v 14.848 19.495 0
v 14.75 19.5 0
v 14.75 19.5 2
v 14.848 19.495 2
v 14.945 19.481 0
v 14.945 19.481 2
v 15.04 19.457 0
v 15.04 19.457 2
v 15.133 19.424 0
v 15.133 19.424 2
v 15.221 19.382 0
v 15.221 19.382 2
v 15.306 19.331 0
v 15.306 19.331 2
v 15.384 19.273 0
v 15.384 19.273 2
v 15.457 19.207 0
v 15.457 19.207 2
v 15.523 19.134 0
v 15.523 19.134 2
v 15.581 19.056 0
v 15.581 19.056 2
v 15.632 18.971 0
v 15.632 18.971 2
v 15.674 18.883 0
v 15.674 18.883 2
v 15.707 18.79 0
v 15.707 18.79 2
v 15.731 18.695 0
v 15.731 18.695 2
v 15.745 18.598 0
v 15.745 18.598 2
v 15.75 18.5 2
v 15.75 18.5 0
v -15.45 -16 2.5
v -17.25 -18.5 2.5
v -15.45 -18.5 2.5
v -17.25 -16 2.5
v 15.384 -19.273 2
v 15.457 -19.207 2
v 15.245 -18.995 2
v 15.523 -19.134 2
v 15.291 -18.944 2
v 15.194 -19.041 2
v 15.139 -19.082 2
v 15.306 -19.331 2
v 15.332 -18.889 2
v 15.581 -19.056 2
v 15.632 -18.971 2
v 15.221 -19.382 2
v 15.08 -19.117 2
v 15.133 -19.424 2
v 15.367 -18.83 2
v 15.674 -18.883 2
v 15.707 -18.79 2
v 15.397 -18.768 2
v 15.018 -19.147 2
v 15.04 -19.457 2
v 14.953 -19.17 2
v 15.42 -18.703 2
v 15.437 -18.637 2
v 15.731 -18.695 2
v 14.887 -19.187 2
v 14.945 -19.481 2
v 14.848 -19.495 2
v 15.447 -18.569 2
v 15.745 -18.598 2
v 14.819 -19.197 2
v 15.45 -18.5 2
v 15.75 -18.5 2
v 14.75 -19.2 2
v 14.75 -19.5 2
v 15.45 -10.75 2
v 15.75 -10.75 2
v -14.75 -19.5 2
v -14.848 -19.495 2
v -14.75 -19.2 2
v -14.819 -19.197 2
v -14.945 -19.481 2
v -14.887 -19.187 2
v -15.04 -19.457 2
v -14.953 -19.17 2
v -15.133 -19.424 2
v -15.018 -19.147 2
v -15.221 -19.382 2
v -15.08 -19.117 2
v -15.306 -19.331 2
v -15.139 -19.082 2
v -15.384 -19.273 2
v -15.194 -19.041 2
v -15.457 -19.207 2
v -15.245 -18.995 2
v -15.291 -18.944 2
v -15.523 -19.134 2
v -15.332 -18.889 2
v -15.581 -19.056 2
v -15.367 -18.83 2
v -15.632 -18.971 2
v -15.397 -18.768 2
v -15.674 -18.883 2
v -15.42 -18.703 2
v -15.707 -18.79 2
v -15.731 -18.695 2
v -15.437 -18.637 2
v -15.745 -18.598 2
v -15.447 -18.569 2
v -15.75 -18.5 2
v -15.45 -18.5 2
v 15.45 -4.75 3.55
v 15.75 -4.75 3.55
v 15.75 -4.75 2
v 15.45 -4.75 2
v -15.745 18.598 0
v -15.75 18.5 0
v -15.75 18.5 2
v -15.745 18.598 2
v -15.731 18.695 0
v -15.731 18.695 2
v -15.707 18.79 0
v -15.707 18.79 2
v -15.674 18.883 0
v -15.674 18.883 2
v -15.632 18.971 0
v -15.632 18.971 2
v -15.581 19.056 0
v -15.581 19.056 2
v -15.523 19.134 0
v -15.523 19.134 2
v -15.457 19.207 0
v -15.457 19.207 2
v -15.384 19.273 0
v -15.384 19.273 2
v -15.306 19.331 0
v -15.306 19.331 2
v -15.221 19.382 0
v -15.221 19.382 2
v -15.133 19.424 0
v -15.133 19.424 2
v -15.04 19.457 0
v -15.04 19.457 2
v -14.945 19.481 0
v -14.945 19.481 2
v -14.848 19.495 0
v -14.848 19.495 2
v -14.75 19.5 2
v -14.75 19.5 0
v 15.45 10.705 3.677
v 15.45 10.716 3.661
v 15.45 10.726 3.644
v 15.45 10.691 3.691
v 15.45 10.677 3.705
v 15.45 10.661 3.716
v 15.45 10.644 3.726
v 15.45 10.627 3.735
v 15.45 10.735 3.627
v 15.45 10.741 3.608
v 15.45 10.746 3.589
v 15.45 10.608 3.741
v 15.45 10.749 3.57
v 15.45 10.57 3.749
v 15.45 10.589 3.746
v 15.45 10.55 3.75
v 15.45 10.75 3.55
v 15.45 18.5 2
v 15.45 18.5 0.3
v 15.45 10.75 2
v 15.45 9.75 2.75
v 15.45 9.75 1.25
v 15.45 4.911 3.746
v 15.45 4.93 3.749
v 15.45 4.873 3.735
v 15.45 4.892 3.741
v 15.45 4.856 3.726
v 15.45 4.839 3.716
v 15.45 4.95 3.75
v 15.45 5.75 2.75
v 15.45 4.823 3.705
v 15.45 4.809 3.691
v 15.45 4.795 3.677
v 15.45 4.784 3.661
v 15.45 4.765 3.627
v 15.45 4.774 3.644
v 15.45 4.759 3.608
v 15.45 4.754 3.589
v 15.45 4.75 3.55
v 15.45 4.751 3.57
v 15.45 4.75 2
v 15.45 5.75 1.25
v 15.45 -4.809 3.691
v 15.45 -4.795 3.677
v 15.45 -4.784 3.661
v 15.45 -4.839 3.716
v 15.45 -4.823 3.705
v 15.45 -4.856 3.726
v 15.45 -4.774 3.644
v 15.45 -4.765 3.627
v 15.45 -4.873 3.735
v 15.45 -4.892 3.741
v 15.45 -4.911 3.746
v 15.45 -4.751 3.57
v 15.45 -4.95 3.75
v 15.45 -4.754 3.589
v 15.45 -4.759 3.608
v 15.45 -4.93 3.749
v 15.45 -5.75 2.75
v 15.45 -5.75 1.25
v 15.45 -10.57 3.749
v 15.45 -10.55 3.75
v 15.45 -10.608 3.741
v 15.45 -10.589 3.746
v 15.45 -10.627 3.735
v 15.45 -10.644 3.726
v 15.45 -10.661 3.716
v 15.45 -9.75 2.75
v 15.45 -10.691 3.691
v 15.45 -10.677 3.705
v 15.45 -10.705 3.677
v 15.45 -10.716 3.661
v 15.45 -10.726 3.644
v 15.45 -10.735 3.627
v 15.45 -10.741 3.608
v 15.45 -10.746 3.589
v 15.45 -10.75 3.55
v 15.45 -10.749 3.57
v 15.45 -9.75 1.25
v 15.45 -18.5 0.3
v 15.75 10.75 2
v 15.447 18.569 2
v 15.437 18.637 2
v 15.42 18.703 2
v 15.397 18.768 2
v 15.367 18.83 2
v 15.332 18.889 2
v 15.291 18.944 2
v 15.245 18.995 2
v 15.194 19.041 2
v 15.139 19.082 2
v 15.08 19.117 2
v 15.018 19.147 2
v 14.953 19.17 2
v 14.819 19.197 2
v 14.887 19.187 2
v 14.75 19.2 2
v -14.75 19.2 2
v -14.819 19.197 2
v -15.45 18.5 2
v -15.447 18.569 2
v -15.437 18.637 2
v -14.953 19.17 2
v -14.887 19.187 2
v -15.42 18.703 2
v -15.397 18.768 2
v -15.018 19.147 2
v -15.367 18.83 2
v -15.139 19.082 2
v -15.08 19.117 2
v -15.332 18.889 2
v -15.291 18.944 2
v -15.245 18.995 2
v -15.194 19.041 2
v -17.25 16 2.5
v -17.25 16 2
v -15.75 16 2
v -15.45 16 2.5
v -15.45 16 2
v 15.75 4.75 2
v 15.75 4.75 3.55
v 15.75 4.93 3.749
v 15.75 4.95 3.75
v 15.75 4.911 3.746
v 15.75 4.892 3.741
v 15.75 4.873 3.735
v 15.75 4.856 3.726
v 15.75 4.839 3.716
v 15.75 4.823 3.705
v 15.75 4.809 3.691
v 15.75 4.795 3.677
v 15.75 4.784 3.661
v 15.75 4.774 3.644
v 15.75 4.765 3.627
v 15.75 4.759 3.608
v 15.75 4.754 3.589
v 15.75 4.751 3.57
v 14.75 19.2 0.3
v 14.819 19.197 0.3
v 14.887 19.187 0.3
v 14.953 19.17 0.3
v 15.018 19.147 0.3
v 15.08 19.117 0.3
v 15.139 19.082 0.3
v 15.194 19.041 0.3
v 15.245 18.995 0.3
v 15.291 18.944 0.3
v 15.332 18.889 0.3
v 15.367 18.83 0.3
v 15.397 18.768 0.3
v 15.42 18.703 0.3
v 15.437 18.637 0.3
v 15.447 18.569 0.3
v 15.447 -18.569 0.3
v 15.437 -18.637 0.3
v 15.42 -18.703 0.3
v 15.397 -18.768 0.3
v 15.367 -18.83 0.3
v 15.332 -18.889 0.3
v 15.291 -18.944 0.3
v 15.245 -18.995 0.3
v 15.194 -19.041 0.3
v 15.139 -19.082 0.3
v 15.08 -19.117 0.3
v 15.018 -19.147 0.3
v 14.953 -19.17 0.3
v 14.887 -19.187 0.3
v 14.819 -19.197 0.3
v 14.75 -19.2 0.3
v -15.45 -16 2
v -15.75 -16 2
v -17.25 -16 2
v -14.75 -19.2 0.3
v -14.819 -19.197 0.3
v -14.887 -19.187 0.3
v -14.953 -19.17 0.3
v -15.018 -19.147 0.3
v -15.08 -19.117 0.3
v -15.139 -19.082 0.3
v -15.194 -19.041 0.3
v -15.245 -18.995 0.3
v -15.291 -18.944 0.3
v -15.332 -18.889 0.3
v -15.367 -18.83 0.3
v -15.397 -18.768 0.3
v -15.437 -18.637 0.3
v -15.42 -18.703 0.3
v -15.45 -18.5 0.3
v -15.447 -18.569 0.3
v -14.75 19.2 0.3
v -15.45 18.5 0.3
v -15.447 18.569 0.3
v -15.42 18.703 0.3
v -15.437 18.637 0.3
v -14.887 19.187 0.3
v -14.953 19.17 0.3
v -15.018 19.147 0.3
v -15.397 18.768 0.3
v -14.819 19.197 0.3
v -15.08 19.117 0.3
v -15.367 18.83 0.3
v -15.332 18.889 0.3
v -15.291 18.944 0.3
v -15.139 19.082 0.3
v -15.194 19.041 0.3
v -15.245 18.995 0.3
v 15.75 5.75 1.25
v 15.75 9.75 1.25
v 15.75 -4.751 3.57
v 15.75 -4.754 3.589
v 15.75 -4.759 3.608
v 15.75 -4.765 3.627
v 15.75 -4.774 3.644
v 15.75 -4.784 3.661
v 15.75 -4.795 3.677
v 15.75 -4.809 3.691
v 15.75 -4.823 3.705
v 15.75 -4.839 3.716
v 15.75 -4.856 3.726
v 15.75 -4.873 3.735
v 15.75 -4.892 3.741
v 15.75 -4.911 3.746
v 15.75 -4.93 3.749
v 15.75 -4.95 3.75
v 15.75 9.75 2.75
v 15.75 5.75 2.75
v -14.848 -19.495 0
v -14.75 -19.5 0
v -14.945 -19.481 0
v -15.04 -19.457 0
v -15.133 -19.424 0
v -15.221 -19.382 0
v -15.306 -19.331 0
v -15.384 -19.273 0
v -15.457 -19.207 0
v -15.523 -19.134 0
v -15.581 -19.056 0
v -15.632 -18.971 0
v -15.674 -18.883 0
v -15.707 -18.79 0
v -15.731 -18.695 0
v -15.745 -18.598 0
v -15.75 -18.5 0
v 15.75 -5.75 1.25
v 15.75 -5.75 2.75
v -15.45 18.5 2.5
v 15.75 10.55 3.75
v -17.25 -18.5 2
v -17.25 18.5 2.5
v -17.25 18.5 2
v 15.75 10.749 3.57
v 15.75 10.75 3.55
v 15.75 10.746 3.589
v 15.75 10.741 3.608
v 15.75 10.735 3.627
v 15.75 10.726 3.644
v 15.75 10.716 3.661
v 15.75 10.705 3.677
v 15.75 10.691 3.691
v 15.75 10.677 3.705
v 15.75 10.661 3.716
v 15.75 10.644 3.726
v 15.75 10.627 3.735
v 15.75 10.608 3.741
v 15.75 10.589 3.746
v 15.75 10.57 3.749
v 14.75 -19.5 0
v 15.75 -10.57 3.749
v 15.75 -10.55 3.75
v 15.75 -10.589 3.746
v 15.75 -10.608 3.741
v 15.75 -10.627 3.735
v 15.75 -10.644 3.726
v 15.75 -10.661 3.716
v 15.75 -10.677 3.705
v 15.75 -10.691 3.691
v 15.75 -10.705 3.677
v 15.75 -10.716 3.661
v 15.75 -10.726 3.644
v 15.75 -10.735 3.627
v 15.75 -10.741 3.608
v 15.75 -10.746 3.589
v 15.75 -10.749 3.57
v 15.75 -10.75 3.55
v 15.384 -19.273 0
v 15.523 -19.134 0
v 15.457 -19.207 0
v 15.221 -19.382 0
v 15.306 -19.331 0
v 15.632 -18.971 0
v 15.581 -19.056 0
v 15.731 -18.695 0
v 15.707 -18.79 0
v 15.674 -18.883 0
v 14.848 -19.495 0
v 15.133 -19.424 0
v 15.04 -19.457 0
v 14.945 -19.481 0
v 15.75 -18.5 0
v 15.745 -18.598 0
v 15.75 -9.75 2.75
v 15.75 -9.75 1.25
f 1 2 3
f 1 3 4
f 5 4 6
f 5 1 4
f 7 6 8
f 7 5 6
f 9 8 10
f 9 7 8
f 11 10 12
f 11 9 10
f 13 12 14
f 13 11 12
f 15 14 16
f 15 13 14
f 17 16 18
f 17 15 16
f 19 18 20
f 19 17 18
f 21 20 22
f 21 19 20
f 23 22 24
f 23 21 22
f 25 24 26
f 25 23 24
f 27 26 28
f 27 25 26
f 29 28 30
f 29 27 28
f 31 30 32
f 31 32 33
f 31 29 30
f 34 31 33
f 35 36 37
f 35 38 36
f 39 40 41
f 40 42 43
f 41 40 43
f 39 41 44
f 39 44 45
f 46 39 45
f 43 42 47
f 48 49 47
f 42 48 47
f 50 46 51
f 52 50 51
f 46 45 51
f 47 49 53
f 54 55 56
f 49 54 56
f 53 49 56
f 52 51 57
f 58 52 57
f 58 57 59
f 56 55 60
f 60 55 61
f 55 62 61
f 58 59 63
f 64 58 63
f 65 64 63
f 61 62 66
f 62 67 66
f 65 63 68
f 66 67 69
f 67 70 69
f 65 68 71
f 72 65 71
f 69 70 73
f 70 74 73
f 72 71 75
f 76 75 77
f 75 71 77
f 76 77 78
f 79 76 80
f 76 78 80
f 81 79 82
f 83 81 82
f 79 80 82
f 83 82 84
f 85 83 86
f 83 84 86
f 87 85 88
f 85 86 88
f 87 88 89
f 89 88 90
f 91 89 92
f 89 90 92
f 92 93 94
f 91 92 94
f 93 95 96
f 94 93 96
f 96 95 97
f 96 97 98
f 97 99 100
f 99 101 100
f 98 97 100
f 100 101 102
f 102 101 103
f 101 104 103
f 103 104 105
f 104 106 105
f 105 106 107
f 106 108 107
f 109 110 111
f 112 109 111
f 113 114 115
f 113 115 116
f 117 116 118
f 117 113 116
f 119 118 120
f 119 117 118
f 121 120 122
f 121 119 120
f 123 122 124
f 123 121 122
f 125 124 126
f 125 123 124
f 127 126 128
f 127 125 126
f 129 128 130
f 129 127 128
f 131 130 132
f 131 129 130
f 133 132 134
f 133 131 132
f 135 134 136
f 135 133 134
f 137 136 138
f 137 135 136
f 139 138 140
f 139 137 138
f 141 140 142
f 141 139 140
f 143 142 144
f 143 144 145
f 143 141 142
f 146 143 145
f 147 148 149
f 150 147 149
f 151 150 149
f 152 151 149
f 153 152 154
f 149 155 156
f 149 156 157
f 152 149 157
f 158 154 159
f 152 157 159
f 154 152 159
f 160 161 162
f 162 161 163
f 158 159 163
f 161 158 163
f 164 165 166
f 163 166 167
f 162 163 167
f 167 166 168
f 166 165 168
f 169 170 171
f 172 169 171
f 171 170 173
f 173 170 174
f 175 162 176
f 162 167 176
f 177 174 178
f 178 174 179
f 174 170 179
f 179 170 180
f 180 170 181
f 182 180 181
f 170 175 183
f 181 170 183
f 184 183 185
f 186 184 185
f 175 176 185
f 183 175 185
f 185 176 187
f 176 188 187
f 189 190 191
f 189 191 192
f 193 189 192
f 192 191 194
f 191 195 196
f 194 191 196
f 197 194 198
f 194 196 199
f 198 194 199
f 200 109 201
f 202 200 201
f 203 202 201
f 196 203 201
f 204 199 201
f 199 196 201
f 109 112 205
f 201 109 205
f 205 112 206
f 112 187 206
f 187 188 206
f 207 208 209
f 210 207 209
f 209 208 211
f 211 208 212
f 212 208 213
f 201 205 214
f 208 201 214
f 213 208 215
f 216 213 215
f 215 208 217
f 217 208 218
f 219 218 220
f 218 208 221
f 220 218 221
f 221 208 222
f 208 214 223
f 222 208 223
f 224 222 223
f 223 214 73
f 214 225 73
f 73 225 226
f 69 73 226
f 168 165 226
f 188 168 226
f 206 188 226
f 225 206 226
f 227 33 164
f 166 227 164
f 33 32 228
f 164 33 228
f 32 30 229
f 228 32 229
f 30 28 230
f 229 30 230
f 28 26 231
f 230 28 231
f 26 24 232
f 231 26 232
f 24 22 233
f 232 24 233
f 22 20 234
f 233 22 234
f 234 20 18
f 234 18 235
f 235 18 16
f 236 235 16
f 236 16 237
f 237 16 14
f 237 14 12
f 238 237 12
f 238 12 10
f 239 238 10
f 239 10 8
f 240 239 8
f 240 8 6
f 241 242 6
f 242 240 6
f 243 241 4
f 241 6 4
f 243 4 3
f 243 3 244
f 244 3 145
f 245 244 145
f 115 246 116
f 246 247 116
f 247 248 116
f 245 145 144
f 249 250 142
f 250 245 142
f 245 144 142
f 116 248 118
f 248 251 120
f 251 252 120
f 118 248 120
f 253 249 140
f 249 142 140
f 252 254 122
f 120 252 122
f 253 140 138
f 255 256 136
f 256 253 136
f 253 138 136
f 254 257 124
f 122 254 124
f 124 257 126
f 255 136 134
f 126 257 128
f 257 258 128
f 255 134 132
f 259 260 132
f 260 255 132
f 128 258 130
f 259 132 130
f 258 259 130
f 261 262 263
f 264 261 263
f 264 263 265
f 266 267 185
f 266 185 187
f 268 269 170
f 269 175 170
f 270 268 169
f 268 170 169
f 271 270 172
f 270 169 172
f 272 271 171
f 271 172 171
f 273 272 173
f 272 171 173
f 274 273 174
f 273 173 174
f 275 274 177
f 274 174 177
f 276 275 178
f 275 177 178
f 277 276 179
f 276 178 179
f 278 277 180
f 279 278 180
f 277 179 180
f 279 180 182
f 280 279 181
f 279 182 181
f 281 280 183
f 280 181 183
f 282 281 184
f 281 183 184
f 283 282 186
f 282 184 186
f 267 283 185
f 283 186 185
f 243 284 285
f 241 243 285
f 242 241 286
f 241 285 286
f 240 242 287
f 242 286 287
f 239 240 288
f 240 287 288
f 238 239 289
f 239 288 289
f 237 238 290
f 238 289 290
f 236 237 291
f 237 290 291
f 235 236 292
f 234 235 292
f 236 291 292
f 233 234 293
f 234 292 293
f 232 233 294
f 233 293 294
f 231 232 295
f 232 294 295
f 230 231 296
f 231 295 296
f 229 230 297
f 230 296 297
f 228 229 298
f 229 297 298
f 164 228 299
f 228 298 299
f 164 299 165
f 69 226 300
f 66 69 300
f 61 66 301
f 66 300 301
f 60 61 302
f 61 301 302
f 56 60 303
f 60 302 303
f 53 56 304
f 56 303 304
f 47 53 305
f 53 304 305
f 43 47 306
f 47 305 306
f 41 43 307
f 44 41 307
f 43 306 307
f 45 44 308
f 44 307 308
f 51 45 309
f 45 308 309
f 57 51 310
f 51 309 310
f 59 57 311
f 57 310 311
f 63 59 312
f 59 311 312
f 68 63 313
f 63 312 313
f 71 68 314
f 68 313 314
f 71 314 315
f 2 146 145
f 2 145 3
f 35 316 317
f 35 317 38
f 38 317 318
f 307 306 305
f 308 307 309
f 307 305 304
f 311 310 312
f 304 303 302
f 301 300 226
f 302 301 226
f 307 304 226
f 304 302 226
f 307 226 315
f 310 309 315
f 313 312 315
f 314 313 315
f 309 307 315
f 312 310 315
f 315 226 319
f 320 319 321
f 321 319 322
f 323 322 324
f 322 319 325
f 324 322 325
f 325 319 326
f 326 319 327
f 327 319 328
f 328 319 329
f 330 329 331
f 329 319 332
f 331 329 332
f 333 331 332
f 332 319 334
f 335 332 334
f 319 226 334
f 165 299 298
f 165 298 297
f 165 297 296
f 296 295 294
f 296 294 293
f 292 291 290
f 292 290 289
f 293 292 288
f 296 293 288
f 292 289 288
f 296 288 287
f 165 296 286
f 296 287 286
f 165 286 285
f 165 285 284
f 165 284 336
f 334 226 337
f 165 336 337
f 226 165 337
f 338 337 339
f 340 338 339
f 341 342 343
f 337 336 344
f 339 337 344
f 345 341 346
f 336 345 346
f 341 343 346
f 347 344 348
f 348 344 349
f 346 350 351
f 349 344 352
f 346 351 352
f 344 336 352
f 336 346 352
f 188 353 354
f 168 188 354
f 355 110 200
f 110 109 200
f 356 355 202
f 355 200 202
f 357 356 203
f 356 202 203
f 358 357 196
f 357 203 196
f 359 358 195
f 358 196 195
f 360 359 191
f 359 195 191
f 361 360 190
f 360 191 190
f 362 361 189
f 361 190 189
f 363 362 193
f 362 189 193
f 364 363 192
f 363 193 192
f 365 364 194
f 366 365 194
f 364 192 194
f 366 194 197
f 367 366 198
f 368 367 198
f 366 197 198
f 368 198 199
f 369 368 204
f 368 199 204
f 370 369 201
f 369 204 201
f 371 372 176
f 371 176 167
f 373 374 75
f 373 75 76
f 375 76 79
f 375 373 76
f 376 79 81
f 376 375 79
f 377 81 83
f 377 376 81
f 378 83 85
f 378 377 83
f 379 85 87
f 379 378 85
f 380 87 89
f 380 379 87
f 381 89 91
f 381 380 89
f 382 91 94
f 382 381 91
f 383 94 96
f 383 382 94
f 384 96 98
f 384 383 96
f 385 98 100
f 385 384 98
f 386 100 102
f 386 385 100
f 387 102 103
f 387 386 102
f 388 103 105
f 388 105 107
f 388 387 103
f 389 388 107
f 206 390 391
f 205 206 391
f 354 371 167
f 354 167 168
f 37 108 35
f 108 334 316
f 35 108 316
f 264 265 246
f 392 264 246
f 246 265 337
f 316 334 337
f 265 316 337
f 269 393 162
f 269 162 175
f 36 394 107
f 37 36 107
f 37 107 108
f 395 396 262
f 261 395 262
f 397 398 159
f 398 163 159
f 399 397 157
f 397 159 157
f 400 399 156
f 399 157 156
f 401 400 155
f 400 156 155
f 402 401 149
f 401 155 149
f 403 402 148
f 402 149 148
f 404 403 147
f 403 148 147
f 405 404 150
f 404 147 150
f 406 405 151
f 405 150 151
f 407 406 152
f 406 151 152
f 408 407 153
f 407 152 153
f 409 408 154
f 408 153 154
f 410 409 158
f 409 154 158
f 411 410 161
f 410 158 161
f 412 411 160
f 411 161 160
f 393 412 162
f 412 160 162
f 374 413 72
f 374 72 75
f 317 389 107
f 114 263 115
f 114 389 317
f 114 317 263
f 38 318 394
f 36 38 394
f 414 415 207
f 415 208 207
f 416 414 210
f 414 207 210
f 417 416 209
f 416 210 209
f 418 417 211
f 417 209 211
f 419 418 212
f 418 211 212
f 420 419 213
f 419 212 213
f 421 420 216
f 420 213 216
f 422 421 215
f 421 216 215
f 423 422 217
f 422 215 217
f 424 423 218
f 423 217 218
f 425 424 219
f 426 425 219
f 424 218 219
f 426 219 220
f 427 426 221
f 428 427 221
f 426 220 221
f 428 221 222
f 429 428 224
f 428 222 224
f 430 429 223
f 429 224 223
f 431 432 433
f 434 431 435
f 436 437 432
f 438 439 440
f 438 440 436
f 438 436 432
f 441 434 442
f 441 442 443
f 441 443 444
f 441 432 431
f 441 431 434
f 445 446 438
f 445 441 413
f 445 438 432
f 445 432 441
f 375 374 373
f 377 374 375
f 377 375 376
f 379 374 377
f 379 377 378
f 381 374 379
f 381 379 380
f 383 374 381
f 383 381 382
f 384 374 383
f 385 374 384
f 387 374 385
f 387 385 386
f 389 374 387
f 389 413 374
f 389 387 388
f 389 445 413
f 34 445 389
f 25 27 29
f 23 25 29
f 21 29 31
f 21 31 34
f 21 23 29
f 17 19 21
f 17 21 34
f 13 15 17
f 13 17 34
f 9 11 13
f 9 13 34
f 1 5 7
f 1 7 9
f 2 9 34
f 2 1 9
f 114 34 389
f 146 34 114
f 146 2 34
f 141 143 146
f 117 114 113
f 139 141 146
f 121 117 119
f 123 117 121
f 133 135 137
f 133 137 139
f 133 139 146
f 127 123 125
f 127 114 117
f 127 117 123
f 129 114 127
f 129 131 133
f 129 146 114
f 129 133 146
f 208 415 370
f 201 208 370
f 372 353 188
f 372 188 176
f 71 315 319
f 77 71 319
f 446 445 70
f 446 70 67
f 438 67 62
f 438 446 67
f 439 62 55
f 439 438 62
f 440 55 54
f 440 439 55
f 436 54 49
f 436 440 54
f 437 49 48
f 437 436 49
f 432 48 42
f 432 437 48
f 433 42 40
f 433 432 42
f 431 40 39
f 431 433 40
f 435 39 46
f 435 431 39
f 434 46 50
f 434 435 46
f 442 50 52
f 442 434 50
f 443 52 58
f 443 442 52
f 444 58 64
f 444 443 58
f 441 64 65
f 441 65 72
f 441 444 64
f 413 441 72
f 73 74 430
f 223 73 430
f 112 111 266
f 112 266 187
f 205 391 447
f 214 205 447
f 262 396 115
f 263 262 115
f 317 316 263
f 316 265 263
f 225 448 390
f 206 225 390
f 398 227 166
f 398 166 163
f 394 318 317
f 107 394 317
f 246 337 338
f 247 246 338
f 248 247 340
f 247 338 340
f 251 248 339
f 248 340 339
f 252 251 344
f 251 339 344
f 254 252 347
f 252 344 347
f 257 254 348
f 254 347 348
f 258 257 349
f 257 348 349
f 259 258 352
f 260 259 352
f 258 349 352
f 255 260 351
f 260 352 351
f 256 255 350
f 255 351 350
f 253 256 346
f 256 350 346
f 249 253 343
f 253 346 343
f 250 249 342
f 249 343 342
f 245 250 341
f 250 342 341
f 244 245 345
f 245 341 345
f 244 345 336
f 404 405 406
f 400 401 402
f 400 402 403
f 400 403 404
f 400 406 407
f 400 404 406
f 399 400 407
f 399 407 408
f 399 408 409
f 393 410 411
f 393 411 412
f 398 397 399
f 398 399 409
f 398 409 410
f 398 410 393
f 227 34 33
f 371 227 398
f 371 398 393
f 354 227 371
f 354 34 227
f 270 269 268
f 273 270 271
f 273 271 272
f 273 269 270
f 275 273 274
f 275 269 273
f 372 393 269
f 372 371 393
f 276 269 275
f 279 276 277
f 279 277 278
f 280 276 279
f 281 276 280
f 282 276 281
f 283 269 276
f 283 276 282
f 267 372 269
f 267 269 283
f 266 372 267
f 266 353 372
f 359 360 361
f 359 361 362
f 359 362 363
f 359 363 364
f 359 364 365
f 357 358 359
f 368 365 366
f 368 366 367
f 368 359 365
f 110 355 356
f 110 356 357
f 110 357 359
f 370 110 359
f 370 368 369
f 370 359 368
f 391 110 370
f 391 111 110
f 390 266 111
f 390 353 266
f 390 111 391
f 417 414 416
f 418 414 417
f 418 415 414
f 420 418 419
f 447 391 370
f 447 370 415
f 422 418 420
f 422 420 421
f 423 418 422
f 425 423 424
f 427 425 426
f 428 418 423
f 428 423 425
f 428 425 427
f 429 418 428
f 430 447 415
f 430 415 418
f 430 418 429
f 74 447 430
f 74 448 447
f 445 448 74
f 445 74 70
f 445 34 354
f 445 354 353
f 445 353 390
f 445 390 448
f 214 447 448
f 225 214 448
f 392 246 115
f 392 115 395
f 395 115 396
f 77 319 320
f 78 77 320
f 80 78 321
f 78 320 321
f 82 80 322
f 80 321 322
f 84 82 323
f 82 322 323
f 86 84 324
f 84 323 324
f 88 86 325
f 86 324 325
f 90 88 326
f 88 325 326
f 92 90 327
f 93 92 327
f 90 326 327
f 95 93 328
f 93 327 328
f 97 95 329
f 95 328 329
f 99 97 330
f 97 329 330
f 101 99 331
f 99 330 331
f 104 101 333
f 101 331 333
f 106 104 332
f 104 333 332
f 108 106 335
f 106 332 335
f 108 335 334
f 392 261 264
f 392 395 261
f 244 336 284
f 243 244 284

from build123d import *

# Parameters (mm, degrees)
BOSS_EXTRUDE1_DEPTH = 2
SHELL1_T            = -0.3
BOSS_EXTRUDE2_DEPTH = 0.3
SKETCH3_W           = 0.75
SKETCH3_H           = 4
CUT_EXTRUDE1_DEPTH  = 0.3
FILLET1_R           = 0.2
BOSS_EXTRUDE4_DEPTH = 0.5


with BuildPart() as part:
    # Sketch1 → Boss-Extrude1 (new body)
    with BuildSketch(Plane.XY):
        with BuildLine():
            Line((-14.75, 19.5), (14.75, 19.5))
            ThreePointArc((14.75, 19.5), (15.457106781, 19.207106781), (15.75, 18.5))
            Line((15.75, 18.5), (15.75, -18.5))
            ThreePointArc((15.75, -18.5), (15.457106781, -19.207106781), (14.75, -19.5))
            Line((14.75, -19.5), (-14.75, -19.5))
            ThreePointArc((-14.75, -19.5), (-15.457106781, -19.207106781), (-15.75, -18.5))
            Line((-15.75, -18.5), (-15.75, 18.5))
            ThreePointArc((-15.75, 18.5), (-15.457106781, 19.207106781), (-14.75, 19.5))
        make_face()
    extrude(amount=BOSS_EXTRUDE1_DEPTH)

    # Shell1
    shell1_openings = [part.faces().sort_by_distance(p)[0] for p in [
        (0, 0, 2),
    ]]
    offset(amount=SHELL1_T, openings=shell1_openings, kind=Kind.INTERSECTION)

    # Sketch2 → Boss-Extrude2 (add)
    with BuildSketch(Plane(origin=(15.75, 0, 0), x_dir=(0, 0, -1), z_dir=(1, 0, 0))):
        Polygon((-2, 10.75), (-3.75, 10.75), (-3.75, 4.75), (-2, 4.75), (-2, 5.75), (-2.75, 5.75), (-2.75, 9.75), (-2, 9.75), align=None)
    boss_extrude2 = extrude(amount=-BOSS_EXTRUDE2_DEPTH)

    # Mirror1: Boss-Extrude2 across plane
    add(boss_extrude2.mirror(Plane.ZX))

    # Sketch3 → Cut-Extrude1 (cut)
    with BuildSketch(Plane(origin=(15.75, 0, 0), x_dir=(0, 0, -1), z_dir=(1, 0, 0))):
        with Locations((-1.625, 7.75)):
            Rectangle(SKETCH3_W, SKETCH3_H)
        with Locations((-1.625, -7.75)):
            Rectangle(SKETCH3_W, SKETCH3_H)
    extrude(amount=-CUT_EXTRUDE1_DEPTH, mode=Mode.SUBTRACT)

    # Fillet1
    fillet1_edges = [part.edges().sort_by_distance(p)[0] for p in [
        (15.6, -10.75, 3.75),
        (15.6, 4.75, 3.75),
        (15.6, 10.75, 3.75),
        (15.6, -4.75, 3.75),
    ]]
    fillet(fillet1_edges, radius=FILLET1_R)

    # Sketch6 → Boss-Extrude4 (add)
    with BuildSketch(Plane.XY.offset(2)):
        Polygon((-17.25, -18.5), (-15.75, -18.5), (-15.45, -18.5), (-15.45, -16), (-15.75, -16), (-17.25, -16), align=None)
        Polygon((-17.25, 16), (-15.75, 16), (-15.45, 16), (-15.45, 18.5), (-15.75, 18.5), (-17.25, 18.5), align=None)
    extrude(amount=BOSS_EXTRUDE4_DEPTH)


solid = part.part
